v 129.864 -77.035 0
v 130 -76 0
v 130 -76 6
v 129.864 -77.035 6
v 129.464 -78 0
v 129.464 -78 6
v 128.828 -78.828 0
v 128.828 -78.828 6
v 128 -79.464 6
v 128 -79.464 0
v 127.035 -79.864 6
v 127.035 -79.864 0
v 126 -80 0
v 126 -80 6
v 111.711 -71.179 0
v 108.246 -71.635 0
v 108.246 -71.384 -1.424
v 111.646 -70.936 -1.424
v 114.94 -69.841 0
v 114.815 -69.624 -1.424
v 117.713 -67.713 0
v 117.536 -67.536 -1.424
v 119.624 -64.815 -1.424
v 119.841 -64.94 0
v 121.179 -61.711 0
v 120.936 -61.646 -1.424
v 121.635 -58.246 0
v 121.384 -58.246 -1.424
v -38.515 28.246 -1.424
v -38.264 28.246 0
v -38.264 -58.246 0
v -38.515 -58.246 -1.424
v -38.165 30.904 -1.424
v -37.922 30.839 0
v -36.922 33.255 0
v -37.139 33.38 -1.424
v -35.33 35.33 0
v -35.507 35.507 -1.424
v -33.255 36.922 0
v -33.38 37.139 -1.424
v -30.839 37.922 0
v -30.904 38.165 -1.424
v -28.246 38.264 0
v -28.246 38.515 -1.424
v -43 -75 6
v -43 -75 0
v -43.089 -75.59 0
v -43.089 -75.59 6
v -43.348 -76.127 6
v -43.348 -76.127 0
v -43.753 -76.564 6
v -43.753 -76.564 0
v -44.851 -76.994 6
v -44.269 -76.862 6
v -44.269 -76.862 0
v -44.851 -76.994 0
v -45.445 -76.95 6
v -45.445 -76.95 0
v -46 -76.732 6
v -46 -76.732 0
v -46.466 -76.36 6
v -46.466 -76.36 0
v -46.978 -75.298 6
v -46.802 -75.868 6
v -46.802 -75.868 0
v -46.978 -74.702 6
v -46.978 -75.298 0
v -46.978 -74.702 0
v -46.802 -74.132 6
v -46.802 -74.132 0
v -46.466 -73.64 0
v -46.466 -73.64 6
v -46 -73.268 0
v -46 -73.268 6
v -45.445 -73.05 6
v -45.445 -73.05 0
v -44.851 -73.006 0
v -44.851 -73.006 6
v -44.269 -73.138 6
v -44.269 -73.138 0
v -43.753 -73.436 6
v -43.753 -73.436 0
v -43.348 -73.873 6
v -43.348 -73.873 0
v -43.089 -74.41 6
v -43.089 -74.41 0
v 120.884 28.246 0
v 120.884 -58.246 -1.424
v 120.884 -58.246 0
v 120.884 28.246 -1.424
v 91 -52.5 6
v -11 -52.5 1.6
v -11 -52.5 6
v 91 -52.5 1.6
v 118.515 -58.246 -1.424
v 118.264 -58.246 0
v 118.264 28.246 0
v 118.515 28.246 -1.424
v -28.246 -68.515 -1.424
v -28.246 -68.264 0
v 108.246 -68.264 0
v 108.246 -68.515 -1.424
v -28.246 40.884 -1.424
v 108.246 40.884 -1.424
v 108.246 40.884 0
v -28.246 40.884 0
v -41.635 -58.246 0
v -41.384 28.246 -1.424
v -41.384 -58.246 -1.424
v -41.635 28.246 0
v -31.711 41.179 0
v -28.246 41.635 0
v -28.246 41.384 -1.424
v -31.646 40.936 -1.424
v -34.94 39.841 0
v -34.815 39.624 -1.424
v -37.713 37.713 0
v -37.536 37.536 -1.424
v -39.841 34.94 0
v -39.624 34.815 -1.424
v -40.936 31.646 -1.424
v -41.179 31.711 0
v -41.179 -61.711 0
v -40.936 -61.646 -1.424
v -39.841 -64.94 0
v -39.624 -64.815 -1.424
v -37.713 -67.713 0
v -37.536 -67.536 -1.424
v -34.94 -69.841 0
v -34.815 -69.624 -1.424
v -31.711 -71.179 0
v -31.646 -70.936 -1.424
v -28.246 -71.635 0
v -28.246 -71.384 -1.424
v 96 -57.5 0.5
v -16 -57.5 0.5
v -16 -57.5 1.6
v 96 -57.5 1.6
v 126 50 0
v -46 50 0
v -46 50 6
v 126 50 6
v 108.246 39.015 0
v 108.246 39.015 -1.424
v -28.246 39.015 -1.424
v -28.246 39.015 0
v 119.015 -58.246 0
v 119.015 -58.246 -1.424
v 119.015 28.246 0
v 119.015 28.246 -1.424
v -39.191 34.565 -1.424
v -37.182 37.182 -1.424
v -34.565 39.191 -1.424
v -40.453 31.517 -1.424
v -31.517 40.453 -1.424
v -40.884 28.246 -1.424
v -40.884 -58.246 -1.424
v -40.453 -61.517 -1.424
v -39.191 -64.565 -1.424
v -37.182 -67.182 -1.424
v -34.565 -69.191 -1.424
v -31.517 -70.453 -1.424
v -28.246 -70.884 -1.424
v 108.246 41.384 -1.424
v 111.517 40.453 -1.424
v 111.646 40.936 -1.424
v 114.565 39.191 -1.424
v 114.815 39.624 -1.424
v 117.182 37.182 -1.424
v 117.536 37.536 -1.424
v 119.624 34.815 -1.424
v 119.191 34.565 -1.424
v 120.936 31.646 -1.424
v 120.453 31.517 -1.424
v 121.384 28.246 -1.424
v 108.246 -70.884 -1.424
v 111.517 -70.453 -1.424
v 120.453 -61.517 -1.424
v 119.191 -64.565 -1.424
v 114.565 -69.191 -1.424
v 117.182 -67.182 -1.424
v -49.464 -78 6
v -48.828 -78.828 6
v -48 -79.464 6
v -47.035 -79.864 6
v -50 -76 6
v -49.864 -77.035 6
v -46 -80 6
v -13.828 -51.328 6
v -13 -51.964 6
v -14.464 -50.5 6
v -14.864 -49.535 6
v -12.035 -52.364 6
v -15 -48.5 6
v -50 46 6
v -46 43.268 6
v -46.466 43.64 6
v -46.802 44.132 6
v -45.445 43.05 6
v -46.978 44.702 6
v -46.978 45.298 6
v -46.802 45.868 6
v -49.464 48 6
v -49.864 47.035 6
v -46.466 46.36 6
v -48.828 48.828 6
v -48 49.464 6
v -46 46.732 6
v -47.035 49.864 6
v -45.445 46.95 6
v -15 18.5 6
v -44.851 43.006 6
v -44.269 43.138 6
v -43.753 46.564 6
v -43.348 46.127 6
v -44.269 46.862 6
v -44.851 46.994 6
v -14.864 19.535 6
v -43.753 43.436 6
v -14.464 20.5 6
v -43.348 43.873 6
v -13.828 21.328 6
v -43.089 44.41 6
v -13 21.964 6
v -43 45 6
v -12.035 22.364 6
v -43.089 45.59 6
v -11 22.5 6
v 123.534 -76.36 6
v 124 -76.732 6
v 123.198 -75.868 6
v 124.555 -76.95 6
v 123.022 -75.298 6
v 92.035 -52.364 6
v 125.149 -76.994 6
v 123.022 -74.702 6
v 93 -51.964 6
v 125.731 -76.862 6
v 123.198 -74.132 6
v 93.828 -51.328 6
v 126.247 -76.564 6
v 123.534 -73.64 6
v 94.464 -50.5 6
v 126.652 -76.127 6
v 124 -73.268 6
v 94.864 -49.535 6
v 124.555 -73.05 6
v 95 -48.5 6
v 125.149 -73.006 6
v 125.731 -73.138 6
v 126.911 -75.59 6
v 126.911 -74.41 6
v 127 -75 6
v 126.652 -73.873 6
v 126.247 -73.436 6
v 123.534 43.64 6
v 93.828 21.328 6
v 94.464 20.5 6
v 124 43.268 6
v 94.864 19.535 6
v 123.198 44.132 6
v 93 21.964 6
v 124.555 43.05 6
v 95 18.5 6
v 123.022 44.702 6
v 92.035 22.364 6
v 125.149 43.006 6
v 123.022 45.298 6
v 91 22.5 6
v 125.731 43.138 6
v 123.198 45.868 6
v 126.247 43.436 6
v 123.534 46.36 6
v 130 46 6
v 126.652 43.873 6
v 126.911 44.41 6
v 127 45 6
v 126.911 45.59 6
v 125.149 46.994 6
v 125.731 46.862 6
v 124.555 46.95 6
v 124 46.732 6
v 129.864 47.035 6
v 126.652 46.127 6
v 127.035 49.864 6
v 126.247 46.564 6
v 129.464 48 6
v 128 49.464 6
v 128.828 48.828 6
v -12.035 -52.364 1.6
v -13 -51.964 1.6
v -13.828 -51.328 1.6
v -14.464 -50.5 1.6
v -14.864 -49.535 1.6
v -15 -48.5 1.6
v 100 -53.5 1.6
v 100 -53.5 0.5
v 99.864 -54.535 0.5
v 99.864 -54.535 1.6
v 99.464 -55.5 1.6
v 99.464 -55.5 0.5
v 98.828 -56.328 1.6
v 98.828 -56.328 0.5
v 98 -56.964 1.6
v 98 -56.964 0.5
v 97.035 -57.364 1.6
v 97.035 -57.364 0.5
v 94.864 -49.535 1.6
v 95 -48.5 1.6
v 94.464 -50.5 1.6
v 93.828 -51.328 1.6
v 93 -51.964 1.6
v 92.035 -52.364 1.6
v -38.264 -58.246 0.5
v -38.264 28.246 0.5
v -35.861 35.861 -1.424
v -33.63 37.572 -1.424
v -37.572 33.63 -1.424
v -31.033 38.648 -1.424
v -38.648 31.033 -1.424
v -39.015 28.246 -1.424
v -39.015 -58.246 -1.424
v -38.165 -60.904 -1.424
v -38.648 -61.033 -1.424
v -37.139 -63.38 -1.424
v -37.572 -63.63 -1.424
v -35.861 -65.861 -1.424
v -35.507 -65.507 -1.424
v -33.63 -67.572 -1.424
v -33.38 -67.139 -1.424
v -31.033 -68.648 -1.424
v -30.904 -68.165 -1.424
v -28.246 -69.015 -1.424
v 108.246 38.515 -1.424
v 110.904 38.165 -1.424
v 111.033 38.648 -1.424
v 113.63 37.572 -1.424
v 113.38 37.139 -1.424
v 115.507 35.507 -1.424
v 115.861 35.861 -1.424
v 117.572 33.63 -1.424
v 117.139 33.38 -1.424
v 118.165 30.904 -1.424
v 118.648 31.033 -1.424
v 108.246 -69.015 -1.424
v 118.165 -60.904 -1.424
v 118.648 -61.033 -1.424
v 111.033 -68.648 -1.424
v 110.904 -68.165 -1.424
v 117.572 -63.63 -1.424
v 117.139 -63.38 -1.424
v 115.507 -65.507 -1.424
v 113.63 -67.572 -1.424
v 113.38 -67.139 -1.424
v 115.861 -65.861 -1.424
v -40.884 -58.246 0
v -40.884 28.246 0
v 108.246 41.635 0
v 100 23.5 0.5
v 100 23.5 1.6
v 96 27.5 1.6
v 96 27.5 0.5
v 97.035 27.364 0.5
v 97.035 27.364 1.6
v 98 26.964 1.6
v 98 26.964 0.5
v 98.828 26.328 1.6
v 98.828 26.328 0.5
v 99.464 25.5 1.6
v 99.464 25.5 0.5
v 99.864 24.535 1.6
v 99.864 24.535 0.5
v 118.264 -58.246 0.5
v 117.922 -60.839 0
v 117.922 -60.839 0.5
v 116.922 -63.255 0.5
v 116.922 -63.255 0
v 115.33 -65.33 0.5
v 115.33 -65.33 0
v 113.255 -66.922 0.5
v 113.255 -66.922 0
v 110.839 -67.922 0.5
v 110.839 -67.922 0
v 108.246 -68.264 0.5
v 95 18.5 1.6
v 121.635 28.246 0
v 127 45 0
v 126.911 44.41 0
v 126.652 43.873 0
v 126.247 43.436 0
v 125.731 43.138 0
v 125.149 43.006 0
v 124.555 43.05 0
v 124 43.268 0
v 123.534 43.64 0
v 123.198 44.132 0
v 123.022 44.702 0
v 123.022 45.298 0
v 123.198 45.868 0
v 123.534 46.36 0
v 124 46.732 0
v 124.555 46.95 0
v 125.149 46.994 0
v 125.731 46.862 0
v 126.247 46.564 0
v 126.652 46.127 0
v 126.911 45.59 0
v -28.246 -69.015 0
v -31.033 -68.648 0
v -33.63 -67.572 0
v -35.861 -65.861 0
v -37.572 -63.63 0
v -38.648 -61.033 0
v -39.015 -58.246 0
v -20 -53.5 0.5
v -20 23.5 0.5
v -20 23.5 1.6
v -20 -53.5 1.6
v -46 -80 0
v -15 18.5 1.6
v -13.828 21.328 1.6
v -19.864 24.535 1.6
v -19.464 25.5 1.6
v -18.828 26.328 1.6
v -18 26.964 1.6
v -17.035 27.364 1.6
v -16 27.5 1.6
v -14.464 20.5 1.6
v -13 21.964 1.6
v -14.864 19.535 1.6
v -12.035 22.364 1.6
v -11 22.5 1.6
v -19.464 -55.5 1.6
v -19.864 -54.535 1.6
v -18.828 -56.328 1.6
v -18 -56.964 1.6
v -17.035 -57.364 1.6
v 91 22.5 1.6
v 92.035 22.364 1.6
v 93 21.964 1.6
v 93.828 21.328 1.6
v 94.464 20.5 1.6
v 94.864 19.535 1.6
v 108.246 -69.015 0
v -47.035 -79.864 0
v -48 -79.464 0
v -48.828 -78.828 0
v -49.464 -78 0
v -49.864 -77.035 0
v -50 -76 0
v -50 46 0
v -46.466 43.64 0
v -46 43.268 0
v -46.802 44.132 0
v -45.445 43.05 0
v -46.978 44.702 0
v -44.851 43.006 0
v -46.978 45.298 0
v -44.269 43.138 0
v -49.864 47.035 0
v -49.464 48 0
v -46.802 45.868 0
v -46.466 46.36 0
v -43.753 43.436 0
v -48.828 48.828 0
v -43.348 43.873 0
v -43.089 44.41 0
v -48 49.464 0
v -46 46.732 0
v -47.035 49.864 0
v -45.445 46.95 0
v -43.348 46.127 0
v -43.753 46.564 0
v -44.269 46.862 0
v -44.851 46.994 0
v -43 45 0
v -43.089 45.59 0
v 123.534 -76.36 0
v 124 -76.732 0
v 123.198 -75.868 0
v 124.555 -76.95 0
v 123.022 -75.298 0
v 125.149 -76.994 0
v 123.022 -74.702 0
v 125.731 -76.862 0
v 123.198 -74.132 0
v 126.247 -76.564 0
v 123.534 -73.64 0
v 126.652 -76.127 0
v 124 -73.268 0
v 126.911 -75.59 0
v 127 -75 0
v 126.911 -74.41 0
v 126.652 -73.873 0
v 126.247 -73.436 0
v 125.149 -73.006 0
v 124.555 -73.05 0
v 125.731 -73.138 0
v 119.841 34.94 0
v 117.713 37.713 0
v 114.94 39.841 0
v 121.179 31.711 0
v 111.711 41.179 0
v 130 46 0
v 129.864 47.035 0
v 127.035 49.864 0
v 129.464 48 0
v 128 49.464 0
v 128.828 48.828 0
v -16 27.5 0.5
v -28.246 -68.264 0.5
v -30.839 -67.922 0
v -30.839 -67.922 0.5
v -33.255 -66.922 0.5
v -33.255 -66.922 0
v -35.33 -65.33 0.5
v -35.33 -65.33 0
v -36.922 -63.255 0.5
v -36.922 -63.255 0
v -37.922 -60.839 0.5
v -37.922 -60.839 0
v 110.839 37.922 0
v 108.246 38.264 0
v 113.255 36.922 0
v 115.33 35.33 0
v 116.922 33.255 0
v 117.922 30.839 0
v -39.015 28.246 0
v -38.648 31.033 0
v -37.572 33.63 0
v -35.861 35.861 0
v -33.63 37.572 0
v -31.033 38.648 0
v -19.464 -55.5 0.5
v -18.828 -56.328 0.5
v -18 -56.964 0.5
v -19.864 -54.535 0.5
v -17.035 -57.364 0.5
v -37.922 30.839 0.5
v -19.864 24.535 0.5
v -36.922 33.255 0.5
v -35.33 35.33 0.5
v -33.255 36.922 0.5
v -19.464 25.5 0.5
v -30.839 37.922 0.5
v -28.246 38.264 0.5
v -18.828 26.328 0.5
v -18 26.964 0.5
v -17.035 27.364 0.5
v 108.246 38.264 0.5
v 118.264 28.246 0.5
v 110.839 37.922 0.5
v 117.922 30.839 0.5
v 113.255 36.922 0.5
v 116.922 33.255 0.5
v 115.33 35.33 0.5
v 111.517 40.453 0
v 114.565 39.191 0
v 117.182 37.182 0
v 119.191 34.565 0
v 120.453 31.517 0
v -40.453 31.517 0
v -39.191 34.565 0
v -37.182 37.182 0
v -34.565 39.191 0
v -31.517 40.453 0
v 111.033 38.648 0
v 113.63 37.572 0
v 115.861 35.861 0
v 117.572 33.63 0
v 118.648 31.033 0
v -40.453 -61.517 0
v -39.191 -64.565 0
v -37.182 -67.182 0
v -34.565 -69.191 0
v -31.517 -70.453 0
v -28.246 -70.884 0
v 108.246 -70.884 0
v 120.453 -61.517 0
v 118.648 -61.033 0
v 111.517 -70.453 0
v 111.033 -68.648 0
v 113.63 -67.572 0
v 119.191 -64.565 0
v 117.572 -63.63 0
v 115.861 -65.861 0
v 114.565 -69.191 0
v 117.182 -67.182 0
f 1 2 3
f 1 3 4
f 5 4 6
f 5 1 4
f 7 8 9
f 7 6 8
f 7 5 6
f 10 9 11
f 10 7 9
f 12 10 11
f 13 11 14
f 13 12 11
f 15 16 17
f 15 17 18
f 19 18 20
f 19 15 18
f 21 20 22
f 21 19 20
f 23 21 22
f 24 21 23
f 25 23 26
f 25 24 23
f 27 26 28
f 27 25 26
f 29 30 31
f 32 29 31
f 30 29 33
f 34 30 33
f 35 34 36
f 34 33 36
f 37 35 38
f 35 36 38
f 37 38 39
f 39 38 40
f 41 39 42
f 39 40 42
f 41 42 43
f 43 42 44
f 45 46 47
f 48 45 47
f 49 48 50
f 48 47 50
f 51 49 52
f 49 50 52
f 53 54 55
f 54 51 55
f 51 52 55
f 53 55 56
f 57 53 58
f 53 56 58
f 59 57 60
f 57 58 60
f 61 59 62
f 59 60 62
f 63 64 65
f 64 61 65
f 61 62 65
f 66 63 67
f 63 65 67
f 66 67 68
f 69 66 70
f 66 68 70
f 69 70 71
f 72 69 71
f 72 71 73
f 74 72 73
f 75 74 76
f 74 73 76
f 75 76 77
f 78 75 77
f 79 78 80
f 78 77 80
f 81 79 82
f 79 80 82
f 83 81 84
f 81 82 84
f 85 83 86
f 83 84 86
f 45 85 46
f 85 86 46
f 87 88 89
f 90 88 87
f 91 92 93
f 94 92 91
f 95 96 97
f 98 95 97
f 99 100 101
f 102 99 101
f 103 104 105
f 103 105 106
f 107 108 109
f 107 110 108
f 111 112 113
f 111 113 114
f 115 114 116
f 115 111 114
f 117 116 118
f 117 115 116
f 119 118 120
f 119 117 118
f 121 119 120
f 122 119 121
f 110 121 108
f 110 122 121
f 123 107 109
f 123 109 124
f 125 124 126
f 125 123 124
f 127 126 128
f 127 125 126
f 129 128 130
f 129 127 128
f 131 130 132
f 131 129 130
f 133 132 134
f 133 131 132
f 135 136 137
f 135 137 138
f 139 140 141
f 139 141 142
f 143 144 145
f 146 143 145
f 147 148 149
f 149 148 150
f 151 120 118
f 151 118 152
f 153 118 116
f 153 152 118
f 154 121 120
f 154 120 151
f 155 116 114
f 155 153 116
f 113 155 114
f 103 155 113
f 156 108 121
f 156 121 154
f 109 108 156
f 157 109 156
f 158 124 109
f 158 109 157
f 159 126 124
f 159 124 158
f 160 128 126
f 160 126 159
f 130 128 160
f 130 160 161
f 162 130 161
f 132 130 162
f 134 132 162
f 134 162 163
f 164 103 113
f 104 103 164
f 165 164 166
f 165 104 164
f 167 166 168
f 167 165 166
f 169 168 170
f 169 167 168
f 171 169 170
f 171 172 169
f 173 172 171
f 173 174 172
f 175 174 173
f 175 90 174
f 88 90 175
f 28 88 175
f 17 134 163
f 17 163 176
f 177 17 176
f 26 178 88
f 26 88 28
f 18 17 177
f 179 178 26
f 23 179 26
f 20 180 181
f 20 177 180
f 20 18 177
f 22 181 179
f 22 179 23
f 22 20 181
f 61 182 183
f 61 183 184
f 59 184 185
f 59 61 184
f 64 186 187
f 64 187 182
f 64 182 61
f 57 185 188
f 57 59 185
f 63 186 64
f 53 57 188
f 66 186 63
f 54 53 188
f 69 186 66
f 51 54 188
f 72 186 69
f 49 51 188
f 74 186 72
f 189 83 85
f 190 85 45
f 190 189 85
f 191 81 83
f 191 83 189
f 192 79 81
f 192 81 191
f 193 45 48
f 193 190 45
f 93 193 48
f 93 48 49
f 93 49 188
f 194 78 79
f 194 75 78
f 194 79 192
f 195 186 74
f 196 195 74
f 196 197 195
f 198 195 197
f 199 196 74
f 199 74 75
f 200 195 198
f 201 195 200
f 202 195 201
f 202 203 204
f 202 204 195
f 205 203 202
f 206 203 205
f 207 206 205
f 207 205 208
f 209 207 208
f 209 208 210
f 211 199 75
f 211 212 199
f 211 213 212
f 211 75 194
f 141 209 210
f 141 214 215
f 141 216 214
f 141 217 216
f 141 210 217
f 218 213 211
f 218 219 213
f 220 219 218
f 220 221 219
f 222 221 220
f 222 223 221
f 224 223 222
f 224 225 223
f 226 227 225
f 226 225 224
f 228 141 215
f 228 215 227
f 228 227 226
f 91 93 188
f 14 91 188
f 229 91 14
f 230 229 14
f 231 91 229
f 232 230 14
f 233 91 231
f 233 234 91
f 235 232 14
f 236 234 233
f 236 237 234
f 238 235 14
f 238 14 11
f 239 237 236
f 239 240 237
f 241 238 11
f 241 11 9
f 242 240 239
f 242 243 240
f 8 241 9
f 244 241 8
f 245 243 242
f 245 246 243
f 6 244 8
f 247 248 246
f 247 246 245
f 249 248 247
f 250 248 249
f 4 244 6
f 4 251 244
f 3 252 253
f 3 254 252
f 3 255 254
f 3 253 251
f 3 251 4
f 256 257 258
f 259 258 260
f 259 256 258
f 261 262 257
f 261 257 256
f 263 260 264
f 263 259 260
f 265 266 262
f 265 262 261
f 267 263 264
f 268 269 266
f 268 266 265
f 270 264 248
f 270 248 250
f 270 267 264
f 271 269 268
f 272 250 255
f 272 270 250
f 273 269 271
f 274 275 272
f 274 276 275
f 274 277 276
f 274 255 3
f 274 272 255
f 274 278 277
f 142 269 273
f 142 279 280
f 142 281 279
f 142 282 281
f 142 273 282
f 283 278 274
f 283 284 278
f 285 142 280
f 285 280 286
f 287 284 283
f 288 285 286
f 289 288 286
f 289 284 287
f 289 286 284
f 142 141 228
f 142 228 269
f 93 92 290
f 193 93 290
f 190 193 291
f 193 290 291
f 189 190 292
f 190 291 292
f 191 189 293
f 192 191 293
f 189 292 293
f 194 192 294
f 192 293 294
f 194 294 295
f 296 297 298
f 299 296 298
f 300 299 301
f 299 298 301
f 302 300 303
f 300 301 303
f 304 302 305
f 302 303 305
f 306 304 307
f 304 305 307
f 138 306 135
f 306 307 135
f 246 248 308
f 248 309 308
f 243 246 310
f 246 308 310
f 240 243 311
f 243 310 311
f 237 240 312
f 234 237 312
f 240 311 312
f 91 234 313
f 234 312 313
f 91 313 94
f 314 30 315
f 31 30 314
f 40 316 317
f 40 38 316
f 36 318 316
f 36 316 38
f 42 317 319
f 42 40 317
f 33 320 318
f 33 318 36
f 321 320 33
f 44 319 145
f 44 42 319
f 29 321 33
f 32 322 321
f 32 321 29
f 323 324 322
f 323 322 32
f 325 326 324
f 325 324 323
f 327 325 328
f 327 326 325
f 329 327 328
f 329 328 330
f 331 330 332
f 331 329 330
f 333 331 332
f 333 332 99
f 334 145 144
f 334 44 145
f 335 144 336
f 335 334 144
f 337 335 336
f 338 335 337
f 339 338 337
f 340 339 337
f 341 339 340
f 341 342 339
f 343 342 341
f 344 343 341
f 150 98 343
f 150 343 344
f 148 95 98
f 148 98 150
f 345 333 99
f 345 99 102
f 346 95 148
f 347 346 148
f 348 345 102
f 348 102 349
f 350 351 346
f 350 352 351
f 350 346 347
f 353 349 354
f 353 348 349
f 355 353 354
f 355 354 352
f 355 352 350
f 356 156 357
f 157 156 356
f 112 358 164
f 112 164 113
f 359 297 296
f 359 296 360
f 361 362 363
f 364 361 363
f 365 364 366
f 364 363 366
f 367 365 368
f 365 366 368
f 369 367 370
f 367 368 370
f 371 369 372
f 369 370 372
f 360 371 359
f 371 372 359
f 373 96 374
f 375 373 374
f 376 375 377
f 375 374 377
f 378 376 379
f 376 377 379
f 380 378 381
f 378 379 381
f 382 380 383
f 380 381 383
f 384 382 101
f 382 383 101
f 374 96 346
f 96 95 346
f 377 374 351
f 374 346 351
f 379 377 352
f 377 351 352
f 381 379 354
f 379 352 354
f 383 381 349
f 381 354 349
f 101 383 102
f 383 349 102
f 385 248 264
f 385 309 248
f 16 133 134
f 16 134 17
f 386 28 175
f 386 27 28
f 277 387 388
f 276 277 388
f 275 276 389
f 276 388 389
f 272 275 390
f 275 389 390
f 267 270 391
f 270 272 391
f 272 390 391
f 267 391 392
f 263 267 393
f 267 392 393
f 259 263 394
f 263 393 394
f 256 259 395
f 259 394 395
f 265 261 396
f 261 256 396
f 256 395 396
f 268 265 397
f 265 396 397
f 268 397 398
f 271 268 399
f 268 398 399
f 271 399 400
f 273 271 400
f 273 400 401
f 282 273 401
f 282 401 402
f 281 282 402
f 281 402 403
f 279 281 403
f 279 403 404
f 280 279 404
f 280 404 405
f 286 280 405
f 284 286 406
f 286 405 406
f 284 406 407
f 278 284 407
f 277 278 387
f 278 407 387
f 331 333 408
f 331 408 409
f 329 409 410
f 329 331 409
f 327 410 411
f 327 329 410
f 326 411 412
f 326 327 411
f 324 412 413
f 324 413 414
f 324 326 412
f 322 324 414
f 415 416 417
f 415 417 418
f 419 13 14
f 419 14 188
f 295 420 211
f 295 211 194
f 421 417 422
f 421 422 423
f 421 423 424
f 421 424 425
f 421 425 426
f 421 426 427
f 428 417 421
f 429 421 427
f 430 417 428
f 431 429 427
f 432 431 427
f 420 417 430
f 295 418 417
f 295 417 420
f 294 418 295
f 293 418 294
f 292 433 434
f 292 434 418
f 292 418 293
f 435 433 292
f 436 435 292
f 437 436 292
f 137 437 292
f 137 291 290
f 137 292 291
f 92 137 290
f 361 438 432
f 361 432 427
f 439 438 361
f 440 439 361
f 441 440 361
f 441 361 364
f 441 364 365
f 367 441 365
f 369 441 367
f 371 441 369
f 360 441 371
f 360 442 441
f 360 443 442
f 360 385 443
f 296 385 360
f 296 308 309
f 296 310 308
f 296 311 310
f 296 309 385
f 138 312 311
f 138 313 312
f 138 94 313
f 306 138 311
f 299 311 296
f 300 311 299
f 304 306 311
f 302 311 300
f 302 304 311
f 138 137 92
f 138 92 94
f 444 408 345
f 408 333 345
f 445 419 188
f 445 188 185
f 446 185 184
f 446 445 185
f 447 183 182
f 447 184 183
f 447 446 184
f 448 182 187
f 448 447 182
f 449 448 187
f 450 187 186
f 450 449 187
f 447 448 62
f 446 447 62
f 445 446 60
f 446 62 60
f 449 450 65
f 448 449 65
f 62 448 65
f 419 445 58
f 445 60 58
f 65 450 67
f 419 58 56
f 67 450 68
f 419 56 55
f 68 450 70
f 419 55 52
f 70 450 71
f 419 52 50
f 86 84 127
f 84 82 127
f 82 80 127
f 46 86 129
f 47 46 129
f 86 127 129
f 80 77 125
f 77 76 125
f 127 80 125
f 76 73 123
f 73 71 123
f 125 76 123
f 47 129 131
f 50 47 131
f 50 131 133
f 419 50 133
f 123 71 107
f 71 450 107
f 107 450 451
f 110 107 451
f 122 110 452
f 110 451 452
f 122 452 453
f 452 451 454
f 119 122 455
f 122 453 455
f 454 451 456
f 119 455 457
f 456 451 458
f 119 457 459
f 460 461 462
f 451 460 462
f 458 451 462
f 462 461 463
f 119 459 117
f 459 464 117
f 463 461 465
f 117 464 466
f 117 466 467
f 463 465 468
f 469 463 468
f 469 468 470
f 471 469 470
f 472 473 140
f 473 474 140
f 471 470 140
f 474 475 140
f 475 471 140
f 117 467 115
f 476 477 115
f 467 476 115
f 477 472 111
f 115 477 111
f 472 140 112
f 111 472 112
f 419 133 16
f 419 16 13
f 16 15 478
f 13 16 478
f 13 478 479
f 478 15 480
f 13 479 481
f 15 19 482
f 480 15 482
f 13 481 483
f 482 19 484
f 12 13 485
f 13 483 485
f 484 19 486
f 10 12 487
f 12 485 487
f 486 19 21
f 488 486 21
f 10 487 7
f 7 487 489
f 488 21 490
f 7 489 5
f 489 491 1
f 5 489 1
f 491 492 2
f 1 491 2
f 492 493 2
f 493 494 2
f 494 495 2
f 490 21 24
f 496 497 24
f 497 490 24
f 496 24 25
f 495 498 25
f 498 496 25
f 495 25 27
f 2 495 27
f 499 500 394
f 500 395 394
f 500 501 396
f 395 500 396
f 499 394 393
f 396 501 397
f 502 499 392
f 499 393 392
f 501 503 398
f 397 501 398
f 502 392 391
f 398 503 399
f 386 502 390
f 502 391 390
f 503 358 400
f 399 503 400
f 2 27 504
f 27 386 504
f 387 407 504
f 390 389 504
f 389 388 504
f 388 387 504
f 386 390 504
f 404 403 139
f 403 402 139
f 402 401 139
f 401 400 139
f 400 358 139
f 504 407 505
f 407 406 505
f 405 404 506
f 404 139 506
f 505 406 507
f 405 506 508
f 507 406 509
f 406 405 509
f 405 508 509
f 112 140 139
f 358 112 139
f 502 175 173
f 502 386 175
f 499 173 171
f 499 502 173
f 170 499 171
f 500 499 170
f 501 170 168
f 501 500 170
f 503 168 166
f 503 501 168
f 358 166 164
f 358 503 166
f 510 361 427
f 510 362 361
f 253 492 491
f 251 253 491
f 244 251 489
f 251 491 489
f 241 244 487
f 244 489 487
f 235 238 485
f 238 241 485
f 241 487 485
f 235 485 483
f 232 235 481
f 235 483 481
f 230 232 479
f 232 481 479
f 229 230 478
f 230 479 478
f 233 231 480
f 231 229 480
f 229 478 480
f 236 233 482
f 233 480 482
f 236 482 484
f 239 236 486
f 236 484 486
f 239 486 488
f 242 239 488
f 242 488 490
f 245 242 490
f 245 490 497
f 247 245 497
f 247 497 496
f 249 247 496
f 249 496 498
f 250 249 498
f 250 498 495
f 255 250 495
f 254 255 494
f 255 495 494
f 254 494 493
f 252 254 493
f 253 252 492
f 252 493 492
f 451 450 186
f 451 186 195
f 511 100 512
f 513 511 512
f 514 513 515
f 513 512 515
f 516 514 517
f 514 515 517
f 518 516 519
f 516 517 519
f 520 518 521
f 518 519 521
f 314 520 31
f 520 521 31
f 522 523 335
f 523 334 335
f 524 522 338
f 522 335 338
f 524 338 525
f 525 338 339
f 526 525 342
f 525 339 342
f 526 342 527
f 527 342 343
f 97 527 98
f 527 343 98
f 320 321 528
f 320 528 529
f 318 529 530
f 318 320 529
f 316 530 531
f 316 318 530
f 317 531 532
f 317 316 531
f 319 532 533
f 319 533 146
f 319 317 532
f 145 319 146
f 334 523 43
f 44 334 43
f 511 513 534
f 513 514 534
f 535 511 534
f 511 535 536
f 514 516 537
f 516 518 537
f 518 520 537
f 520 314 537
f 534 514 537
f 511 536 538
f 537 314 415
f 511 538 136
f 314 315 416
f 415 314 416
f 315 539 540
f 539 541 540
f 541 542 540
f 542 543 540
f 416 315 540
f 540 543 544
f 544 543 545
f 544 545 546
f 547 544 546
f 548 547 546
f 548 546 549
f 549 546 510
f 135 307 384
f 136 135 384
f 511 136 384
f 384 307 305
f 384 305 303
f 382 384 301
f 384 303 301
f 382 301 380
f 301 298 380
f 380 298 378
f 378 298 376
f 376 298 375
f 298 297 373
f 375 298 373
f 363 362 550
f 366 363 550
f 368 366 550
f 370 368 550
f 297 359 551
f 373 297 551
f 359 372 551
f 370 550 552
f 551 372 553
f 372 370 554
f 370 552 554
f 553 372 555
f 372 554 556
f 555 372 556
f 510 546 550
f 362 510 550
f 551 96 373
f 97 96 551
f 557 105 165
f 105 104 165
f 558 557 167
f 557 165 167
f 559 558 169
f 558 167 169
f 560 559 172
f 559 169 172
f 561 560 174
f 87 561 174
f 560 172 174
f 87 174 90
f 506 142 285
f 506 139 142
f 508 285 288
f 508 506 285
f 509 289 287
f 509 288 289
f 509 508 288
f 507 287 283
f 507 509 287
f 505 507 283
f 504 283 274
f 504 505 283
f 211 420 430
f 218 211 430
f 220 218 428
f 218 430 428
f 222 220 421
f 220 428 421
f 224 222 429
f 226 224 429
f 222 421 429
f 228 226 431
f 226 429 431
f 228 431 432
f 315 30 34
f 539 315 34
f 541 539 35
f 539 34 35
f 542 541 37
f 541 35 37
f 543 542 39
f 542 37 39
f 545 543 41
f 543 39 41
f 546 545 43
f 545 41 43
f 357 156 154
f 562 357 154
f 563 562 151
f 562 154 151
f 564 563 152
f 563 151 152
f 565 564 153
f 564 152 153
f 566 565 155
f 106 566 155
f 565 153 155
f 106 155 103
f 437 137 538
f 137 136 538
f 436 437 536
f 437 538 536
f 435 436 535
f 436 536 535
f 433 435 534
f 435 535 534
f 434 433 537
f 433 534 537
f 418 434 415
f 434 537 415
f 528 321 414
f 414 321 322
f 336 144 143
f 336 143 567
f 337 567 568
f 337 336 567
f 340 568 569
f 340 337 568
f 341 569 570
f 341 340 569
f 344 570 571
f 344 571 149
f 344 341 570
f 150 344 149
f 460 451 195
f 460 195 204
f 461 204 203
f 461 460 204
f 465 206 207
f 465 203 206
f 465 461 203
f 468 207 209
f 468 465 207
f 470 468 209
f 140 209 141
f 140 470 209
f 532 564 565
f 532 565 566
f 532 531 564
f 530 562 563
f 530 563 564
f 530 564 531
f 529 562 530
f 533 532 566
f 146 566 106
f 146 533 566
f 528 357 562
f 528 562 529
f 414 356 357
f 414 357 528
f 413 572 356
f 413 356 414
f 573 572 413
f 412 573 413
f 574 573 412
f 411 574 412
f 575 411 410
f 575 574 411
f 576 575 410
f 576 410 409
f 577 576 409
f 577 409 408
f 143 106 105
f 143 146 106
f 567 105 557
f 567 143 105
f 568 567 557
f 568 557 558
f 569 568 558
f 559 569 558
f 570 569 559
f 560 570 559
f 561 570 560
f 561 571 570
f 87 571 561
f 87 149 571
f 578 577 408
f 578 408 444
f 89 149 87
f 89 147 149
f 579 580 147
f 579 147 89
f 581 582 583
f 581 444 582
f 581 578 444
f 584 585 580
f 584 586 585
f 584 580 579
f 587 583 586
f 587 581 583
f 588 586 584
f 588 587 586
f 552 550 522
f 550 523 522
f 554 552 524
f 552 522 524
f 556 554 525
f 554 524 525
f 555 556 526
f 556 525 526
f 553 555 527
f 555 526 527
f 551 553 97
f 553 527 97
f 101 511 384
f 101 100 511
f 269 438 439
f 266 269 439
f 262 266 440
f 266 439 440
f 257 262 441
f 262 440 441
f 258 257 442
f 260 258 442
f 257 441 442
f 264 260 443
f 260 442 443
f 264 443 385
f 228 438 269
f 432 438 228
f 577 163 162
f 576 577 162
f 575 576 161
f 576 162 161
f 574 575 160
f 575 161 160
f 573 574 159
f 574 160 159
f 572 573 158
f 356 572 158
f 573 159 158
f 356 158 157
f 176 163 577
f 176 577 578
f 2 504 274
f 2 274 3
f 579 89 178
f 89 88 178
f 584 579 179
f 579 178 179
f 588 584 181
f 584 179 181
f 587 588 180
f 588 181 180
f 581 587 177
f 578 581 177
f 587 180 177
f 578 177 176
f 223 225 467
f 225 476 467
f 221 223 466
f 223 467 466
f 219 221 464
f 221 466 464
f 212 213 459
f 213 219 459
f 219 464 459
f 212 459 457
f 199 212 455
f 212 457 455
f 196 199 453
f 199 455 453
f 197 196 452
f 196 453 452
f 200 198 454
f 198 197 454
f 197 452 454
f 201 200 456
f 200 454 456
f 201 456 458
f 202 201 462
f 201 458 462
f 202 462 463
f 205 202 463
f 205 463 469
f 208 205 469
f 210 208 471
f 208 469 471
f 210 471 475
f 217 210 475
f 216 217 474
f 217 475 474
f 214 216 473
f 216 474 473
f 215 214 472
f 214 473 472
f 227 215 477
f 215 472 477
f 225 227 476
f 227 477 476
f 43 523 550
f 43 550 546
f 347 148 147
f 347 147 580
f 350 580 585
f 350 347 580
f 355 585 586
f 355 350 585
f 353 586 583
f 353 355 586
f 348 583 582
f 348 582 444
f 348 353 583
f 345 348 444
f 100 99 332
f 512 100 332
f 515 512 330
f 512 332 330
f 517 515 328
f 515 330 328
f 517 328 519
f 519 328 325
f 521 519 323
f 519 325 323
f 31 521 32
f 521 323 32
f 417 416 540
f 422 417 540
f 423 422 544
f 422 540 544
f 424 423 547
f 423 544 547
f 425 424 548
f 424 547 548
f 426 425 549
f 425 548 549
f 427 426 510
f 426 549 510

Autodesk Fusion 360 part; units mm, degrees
sketch "Sketch2" plane through (0, 0, 0) normal (0, 0, 1) x (1, 0, 0)
  line L0 (-46, 50) -> (126, 50)
  line L1 (130, 46) -> (130, -76)
  line L2 (126, -80) -> (-46, -80)
  line L3 (-50, -76) -> (-50, 46)
  circle A0 centre (-45, 45) radius 2
  line L4 (40, -80) -> (40, 50) construction
  line L5 (-50, -15) -> (130, -15) construction
  arc A1 (-46, 50) -> (-50, 46) centre (-46, 46) ccw
  circle A2 centre (125, 45) radius 2
  arc A3 (130, 46) -> (126, 50) centre (126, 46) ccw
  circle A4 centre (125, -75) radius 2
  arc A5 (126, -80) -> (130, -76) centre (126, -76) ccw
  circle A6 centre (-45, -75) radius 2
  arc A7 (-50, -76) -> (-46, -80) centre (-46, -76) ccw
  point P0 (-50, 50)
  point P1 (130, 50)
  dimension "d3" = 4
  dimension "d4" = 5
  dimension "d5" = 5
  dimension "d6" = 4
  dimension "d63" = 180
  dimension "d64" = 130
extrude "Extrude1" add sketch "Sketch2" along normal blind 6
sketch "Sketch3" plane through (0, 0, 0) normal (0, 0, -1) x (1, 0, 0)
  circle A0 centre (125, 75) radius 2
  circle A1 centre (-45, 75) radius 2
  circle A2 centre (-45, -45) radius 2
  circle A3 centre (125, -45) radius 2
  arc A4 (-50, -46) -> (-46, -50) centre (-46, -46) ccw
  line L0 (-46, -50) -> (126, -50)
  arc A5 (126, -50) -> (130, -46) centre (126, -46) ccw
  line L1 (130, -46) -> (130, 76)
  arc A6 (130, 76) -> (126, 80) centre (126, 76) ccw
  line L2 (126, 80) -> (-46, 80)
  arc A7 (-46, 80) -> (-50, 76) centre (-46, 76) ccw
  line L3 (-50, 76) -> (-50, -46)
  line L4 (40, 80) -> (40, -50) construction
  line L5 (130, 15) -> (-50, 15) construction
  line L6 (119.9494, -39.9494) -> (-39.9494, -39.9494) construction
  line L7 (-39.9494, -39.9494) -> (-39.9494, 69.9494) construction
  line L8 (-39.9494, 69.9494) -> (119.9494, 69.9494) construction
  line L9 (119.9494, 69.9494) -> (119.9494, -39.9494) construction
  line L10 (119.9494, -39.9494) -> (-39.9494, 69.9494) construction
  line L11 (-39.9494, -39.9494) -> (119.9494, 69.9494) construction
  line L12 (108.2459, -41.3839) -> (-28.2459, -41.3839)
  line L13 (-41.3839, -28.2459) -> (-41.3839, 58.2459)
  line L14 (-28.2459, 71.3839) -> (108.2459, 71.3839)
  line L15 (121.3839, 58.2459) -> (121.3839, -28.2459)
  line L16 (95.6336, -23.5438) -> (-41.3839, 71.3839) construction
  line L17 (-38.6963, -33.1786) -> (83.6146, 41.7012) construction
  line L18 (-38.5149, -28.2459) -> (-38.5149, 58.2459)
  line L19 (-28.2459, 68.5149) -> (108.2459, 68.5149)
  line L20 (118.5149, 58.2459) -> (118.5149, -28.2459)
  line L21 (104.513, -28.9713) -> (-38.5149, 68.5149) construction
  line L22 (-36.0332, -30.305) -> (80.8211, 39.3236) construction
  arc A8 (-28.2459, 68.5149) -> (-38.5149, 58.2459) centre (-28.2459, 58.2459) ccw
  arc A9 (-28.2459, 71.3839) -> (-41.3839, 58.2459) centre (-28.2459, 58.2459) ccw
  arc A10 (118.5149, 58.2459) -> (108.2459, 68.5149) centre (108.2459, 58.2459) ccw
  arc A11 (121.3839, 58.2459) -> (108.2459, 71.3839) centre (108.2459, 58.2459) ccw
  arc A12 (-38.5149, -28.2459) -> (-28.2459, -38.5149) centre (-28.2459, -28.2459) ccw
  arc A13 (-41.3839, -28.2459) -> (-28.2459, -41.3839) centre (-28.2459, -28.2459) ccw
  arc A14 (108.2459, -38.5149) -> (118.5149, -28.2459) centre (108.2459, -28.2459) ccw
  arc A15 (108.2459, -41.3839) -> (121.3839, -28.2459) centre (108.2459, -28.2459) ccw
  line L23 (108.2459, -38.5149) -> (-28.2459, -38.5149)
  point P0 (40, 15)
  point P1 (40, 15)
  point P2 (40, 15)
  point P3 (40, 15)
  point P4 (40, 15)
  dimension "d25" = 159.8988
  dimension "d27" = 109.8988
  dimension "d28" = 1.4345
  dimension "d29" = 1.4345
  dimension "d30" = 1.4345
  dimension "d31" = 1.4345
  dimension "d44" = 10.269
  dimension "d45" = 13.138
extrude "Extrude4" add sketch "Sketch3" along normal blind 1.424 contours L12 L13 L14 L15 A9 A11 A13 A15
draft "Draft3" angle 10 neutral plane through (0, 0, -1.424) pull (0, 0, -1) 16 faces at (62.7486, -68.5149, -0.9493) (117.7793, -62.0625, -0.9493) (118.5149, -29.4153, -0.4747) (115.6779, 35.3323, -0.9493) (62.7486, 38.5149, -0.4747) (-32.9514, 37.3734, -0.9493) (-38.5149, -29.4153, -0.9493) (-35.6779, -65.3323, -0.9493) (-41.3839, -0.5847, -0.4747) (-33.1288, 40.4428, -0.9493) (17.2514, 41.3839, -0.9493) (116.3673, 38.5731, -0.9493) (121.3839, -29.4153, -0.9493) (119.6238, -64.8149, -0.9493) (62.7486, -71.3839, -0.9493) (-38.9478, -65.8667, -0.9493)
sketch "Sketch5" plane through (0, 0, -1.424) normal (0, 0, -1) x (1, 0, 0)
  line L0 (-28.2459, 68.5149) -> (108.2459, 68.5149)
  line L1 (118.5149, 58.2459) -> (118.5149, -28.2459)
  line L2 (108.2459, -38.5149) -> (-28.2459, -38.5149)
  line L3 (-38.5149, -28.2459) -> (-38.5149, 58.2459)
  line L4 (108.2459, 71.3839) -> (-28.2459, 71.3839)
  line L5 (-41.3839, 58.2459) -> (-41.3839, -28.2459)
  line L6 (-28.2459, -41.3839) -> (108.2459, -41.3839)
  line L7 (121.3839, -28.2459) -> (121.3839, 58.2459)
  line L8 (40, 71.3839) -> (40, -41.3839) construction
  line L9 (121.3839, 15) -> (-41.3839, 15) construction
  line L10 (119.9494, -39.9494) -> (-39.9494, -39.9494) construction
  line L11 (-39.9494, -39.9494) -> (-39.9494, 69.9494) construction
  line L12 (-39.9494, 69.9494) -> (119.9494, 69.9494) construction
  line L13 (119.9494, 69.9494) -> (119.9494, -39.9494) construction
  line L14 (119.9494, -39.9494) -> (-39.9494, 69.9494) construction
  line L15 (-39.9494, -39.9494) -> (119.9494, 69.9494) construction
  line L16 (108.2459, -40.8839) -> (-28.2459, -40.8839)
  line L17 (-40.8839, -28.2459) -> (-40.8839, 58.2459)
  line L18 (-28.2459, 70.8839) -> (108.2459, 70.8839)
  line L19 (120.8839, 58.2459) -> (120.8839, -28.2459)
  line L20 (98.0985, -25.1411) -> (-40.8839, 70.8839) construction
  line L21 (-40.8839, -40.8839) -> (98.0985, 55.1411) construction
  line L22 (108.2459, -39.0149) -> (-28.2459, -39.0149)
  line L23 (-39.0149, -28.2459) -> (-39.0149, 58.2459)
  line L24 (119.0149, 58.2459) -> (119.0149, -28.2459)
  line L25 (97.1479, -24.0666) -> (-39.0149, 69.0149) construction
  line L26 (-39.0149, -39.0149) -> (97.1479, 54.0666) construction
  arc A0 (118.5149, 58.2459) -> (108.2459, 68.5149) centre (108.2459, 58.2459) ccw
  arc A1 (108.2459, -38.5149) -> (118.5149, -28.2459) centre (108.2459, -28.2459) ccw
  arc A2 (-38.5149, -28.2459) -> (-28.2459, -38.5149) centre (-28.2459, -28.2459) ccw
  arc A3 (-28.2459, 68.5149) -> (-38.5149, 58.2459) centre (-28.2459, 58.2459) ccw
  arc A4 (-41.3839, -28.2459) -> (-28.2459, -41.3839) centre (-28.2459, -28.2459) ccw
  arc A5 (108.2459, -41.3839) -> (121.3839, -28.2459) centre (108.2459, -28.2459) ccw
  arc A6 (121.3839, 58.2459) -> (108.2459, 71.3839) centre (108.2459, 58.2459) ccw
  arc A7 (-28.2459, 71.3839) -> (-41.3839, 58.2459) centre (-28.2459, 58.2459) ccw
  arc A8 (-28.2459, 69.0149) -> (-39.0149, 58.2459) centre (-28.2459, 58.2459) ccw
  arc A9 (-28.2459, 70.8839) -> (-40.8839, 58.2459) centre (-28.2459, 58.2459) ccw
  arc A10 (119.0149, 58.2459) -> (108.2459, 69.0149) centre (108.2459, 58.2459) ccw
  arc A11 (120.8839, 58.2459) -> (108.2459, 70.8839) centre (108.2459, 58.2459) ccw
  line L27 (-28.2459, 69.0149) -> (108.2459, 69.0149)
  arc A12 (108.2459, -39.0149) -> (119.0149, -28.2459) centre (108.2459, -28.2459) ccw
  arc A13 (108.2459, -40.8839) -> (120.8839, -28.2459) centre (108.2459, -28.2459) ccw
  arc A14 (-39.0149, -28.2459) -> (-28.2459, -39.0149) centre (-28.2459, -28.2459) ccw
  arc A15 (-40.8839, -28.2459) -> (-28.2459, -40.8839) centre (-28.2459, -28.2459) ccw
  point P0 (40, 15)
  point P1 (40, 15)
  point P2 (40, 15)
  dimension "d36" = 159.8988
  dimension "d37" = 109.8988
  dimension "d38" = 0.9345
  dimension "d39" = 0.9345
  dimension "d40" = 0.9345
  dimension "d41" = 0.9345
  dimension "d50" = 10.769
  dimension "d51" = 12.638
extrude "Extrude6" cut sketch "Sketch5" against normal blind 1.424 contours L16 L17 L18 L19 A9 A11 A13 A15
extrude "Extrude7" cut 1 faces at (17.2514, 2.7546, 0) along direction (0, 0, 1) blind 0.5
sketch "Sketch6" plane through (0, 0, 0.5) normal (0, 0, -1) x (1, 0, 0)
  line L0 (108.2459, 68.2638) -> (-28.2459, 68.2638)
  arc A0 (-28.2459, 68.2638) -> (-38.2638, 58.2459) centre (-28.2459, 58.2459) ccw
  line L1 (-38.2638, 58.2459) -> (-38.2638, -28.2459)
  arc A1 (-38.2638, -28.2459) -> (-28.2459, -38.2638) centre (-28.2459, -28.2459) ccw
  line L2 (-28.2459, -38.2638) -> (108.2459, -38.2638)
  arc A2 (108.2459, -38.2638) -> (118.2638, -28.2459) centre (108.2459, -28.2459) ccw
  line L3 (118.2638, -28.2459) -> (118.2638, 58.2459)
  arc A3 (118.2638, 58.2459) -> (108.2459, 68.2638) centre (108.2459, 58.2459) ccw
  line L4 (40, 68.2638) -> (40, -38.2638) construction
  line L5 (-38.2638, 15) -> (118.2638, 15) construction
  line L6 (96, -27.5) -> (-16, -27.5)
  line L7 (-20, -23.5) -> (-20, 53.5)
  line L8 (-16, 57.5) -> (96, 57.5)
  line L9 (100, 53.5) -> (100, -23.5)
  line L10 (100, -27.5) -> (-20, 57.5) construction
  line L11 (-20, -27.5) -> (100, 57.5) construction
  arc A4 (-16, 57.5) -> (-20, 53.5) centre (-16, 53.5) ccw
  arc A5 (100, 53.5) -> (96, 57.5) centre (96, 53.5) ccw
  arc A6 (96, -27.5) -> (100, -23.5) centre (96, -23.5) ccw
  arc A7 (-20, -23.5) -> (-16, -27.5) centre (-16, -23.5) ccw
  point P0 (40, 15)
  dimension "d58" = 120
  dimension "d59" = 85
  dimension "d68" = 4
  dimension "d69" = 4
  dimension "d70" = 4
  dimension "d71" = 4
extrude "Extrude8" cut sketch "Sketch6" against normal blind 1.1 contours L6 L7 L8 L9 A4 A5 A6 A7
sketch "Sketch7" plane through (0, 0, 1.6) normal (0, 0, -1) x (1, 0, 0)
  line L0 (96, 57.5) -> (-16, 57.5)
  line L1 (-20, 53.5) -> (-20, -23.5)
  line L2 (-16, -27.5) -> (96, -27.5)
  line L3 (100, -23.5) -> (100, 53.5)
  line L4 (40, 57.5) -> (40, -27.5) construction
  line L5 (100, 15) -> (-20, 15) construction
  line L6 (91, -22.5) -> (-11, -22.5)
  line L7 (-15, -18.5) -> (-15, 48.5)
  line L8 (-11, 52.5) -> (91, 52.5)
  line L9 (95, 48.5) -> (95, -18.5)
  line L10 (95, -22.5) -> (-15, 52.5) construction
  line L11 (-15, -22.5) -> (95, 52.5) construction
  arc A0 (-16, 57.5) -> (-20, 53.5) centre (-16, 53.5) ccw
  arc A1 (-20, -23.5) -> (-16, -27.5) centre (-16, -23.5) ccw
  arc A2 (96, -27.5) -> (100, -23.5) centre (96, -23.5) ccw
  arc A3 (100, 53.5) -> (96, 57.5) centre (96, 53.5) ccw
  arc A4 (-11, 52.5) -> (-15, 48.5) centre (-11, 48.5) ccw
  arc A5 (95, 48.5) -> (91, 52.5) centre (91, 48.5) ccw
  arc A6 (91, -22.5) -> (95, -18.5) centre (91, -18.5) ccw
  arc A7 (-15, -18.5) -> (-11, -22.5) centre (-11, -18.5) ccw
  point P0 (40, 15)
  dimension "d62" = 110
  dimension "d65" = 75
  dimension "d72" = 4
  dimension "d73" = 4
  dimension "d74" = 4
  dimension "d75" = 4
extrude "Extrude9" cut sketch "Sketch7" against normal blind 8.4 contours L6 L7 L8 L9 A4 A5 A6 A7
equation "ORingDiameter = 1.78 mm" comment "Diamter of the O ring"
equation "ORingInnerDiameter = 170 mm" comment "Inner diamter of the o ring bore"
equation "d25 = ( ORingPerimeter - 100 mm ) / 4 + 50 mm"
equation "ORingPerimeter = 2 * 3.1412 * ( ( ORingInnerDiameter / 2 ) + ORingDiameter / 2 )"
equation "d27 = ( ORingPerimeter - 100 mm ) / 4"
equation "d28 = ( ( ORingDiameter * 1.05 ) / 2 ) + 0.5 mm"
equation "d29 = ( ( ORingDiameter * 1.05 ) / 2 ) + 0.5 mm"
equation "d30 = ( ( ORingDiameter * 1.05 ) / 2 ) + 0.5 mm"
equation "d31 = ( ( ORingDiameter * 1.05 ) / 2 ) + 0.5 mm"
equation "d32 = ORingDiameter * 0.8"
equation "d36 = ( ORingPerimeter - 100 mm ) / 4 + 50 mm"
equation "d37 = ( ORingPerimeter - 100 mm ) / 4"
equation "d38 = ( ORingDiameter * 1.05 ) / 2"
equation "d39 = ( ORingDiameter * 1.05 ) / 2"
equation "d40 = ( ORingDiameter * 1.05 ) / 2"
equation "d41 = ( ORingDiameter * 1.05 ) / 2"
equation "d44 = ( ORingDiameter ) * 6 + ORingDiameter * 0.05 - 0.5 mm"
equation "d45 = ( ORingDiameter ) * 6 + ( ORingDiameter * 1.1 ) + 0.5 mm"
equation "d50 = ( ORingDiameter ) * 6 + ORingDiameter * 0.05 - 0.0 mm"
equation "d51 = ( ORingDiameter ) * 6 + ORingDiameter * 1.1 + 0 mm"
equation "d52 = -( ORingDiameter * 0.8 )"
equation "PanelWidth = 85 mm"
equation "PanelLength = 120 mm"
equation "d58 = PanelLength"
equation "d59 = PanelWidth"
equation "d62 = PanelLength - 10 mm"
equation "d65 = PanelWidth - 10 mm"
